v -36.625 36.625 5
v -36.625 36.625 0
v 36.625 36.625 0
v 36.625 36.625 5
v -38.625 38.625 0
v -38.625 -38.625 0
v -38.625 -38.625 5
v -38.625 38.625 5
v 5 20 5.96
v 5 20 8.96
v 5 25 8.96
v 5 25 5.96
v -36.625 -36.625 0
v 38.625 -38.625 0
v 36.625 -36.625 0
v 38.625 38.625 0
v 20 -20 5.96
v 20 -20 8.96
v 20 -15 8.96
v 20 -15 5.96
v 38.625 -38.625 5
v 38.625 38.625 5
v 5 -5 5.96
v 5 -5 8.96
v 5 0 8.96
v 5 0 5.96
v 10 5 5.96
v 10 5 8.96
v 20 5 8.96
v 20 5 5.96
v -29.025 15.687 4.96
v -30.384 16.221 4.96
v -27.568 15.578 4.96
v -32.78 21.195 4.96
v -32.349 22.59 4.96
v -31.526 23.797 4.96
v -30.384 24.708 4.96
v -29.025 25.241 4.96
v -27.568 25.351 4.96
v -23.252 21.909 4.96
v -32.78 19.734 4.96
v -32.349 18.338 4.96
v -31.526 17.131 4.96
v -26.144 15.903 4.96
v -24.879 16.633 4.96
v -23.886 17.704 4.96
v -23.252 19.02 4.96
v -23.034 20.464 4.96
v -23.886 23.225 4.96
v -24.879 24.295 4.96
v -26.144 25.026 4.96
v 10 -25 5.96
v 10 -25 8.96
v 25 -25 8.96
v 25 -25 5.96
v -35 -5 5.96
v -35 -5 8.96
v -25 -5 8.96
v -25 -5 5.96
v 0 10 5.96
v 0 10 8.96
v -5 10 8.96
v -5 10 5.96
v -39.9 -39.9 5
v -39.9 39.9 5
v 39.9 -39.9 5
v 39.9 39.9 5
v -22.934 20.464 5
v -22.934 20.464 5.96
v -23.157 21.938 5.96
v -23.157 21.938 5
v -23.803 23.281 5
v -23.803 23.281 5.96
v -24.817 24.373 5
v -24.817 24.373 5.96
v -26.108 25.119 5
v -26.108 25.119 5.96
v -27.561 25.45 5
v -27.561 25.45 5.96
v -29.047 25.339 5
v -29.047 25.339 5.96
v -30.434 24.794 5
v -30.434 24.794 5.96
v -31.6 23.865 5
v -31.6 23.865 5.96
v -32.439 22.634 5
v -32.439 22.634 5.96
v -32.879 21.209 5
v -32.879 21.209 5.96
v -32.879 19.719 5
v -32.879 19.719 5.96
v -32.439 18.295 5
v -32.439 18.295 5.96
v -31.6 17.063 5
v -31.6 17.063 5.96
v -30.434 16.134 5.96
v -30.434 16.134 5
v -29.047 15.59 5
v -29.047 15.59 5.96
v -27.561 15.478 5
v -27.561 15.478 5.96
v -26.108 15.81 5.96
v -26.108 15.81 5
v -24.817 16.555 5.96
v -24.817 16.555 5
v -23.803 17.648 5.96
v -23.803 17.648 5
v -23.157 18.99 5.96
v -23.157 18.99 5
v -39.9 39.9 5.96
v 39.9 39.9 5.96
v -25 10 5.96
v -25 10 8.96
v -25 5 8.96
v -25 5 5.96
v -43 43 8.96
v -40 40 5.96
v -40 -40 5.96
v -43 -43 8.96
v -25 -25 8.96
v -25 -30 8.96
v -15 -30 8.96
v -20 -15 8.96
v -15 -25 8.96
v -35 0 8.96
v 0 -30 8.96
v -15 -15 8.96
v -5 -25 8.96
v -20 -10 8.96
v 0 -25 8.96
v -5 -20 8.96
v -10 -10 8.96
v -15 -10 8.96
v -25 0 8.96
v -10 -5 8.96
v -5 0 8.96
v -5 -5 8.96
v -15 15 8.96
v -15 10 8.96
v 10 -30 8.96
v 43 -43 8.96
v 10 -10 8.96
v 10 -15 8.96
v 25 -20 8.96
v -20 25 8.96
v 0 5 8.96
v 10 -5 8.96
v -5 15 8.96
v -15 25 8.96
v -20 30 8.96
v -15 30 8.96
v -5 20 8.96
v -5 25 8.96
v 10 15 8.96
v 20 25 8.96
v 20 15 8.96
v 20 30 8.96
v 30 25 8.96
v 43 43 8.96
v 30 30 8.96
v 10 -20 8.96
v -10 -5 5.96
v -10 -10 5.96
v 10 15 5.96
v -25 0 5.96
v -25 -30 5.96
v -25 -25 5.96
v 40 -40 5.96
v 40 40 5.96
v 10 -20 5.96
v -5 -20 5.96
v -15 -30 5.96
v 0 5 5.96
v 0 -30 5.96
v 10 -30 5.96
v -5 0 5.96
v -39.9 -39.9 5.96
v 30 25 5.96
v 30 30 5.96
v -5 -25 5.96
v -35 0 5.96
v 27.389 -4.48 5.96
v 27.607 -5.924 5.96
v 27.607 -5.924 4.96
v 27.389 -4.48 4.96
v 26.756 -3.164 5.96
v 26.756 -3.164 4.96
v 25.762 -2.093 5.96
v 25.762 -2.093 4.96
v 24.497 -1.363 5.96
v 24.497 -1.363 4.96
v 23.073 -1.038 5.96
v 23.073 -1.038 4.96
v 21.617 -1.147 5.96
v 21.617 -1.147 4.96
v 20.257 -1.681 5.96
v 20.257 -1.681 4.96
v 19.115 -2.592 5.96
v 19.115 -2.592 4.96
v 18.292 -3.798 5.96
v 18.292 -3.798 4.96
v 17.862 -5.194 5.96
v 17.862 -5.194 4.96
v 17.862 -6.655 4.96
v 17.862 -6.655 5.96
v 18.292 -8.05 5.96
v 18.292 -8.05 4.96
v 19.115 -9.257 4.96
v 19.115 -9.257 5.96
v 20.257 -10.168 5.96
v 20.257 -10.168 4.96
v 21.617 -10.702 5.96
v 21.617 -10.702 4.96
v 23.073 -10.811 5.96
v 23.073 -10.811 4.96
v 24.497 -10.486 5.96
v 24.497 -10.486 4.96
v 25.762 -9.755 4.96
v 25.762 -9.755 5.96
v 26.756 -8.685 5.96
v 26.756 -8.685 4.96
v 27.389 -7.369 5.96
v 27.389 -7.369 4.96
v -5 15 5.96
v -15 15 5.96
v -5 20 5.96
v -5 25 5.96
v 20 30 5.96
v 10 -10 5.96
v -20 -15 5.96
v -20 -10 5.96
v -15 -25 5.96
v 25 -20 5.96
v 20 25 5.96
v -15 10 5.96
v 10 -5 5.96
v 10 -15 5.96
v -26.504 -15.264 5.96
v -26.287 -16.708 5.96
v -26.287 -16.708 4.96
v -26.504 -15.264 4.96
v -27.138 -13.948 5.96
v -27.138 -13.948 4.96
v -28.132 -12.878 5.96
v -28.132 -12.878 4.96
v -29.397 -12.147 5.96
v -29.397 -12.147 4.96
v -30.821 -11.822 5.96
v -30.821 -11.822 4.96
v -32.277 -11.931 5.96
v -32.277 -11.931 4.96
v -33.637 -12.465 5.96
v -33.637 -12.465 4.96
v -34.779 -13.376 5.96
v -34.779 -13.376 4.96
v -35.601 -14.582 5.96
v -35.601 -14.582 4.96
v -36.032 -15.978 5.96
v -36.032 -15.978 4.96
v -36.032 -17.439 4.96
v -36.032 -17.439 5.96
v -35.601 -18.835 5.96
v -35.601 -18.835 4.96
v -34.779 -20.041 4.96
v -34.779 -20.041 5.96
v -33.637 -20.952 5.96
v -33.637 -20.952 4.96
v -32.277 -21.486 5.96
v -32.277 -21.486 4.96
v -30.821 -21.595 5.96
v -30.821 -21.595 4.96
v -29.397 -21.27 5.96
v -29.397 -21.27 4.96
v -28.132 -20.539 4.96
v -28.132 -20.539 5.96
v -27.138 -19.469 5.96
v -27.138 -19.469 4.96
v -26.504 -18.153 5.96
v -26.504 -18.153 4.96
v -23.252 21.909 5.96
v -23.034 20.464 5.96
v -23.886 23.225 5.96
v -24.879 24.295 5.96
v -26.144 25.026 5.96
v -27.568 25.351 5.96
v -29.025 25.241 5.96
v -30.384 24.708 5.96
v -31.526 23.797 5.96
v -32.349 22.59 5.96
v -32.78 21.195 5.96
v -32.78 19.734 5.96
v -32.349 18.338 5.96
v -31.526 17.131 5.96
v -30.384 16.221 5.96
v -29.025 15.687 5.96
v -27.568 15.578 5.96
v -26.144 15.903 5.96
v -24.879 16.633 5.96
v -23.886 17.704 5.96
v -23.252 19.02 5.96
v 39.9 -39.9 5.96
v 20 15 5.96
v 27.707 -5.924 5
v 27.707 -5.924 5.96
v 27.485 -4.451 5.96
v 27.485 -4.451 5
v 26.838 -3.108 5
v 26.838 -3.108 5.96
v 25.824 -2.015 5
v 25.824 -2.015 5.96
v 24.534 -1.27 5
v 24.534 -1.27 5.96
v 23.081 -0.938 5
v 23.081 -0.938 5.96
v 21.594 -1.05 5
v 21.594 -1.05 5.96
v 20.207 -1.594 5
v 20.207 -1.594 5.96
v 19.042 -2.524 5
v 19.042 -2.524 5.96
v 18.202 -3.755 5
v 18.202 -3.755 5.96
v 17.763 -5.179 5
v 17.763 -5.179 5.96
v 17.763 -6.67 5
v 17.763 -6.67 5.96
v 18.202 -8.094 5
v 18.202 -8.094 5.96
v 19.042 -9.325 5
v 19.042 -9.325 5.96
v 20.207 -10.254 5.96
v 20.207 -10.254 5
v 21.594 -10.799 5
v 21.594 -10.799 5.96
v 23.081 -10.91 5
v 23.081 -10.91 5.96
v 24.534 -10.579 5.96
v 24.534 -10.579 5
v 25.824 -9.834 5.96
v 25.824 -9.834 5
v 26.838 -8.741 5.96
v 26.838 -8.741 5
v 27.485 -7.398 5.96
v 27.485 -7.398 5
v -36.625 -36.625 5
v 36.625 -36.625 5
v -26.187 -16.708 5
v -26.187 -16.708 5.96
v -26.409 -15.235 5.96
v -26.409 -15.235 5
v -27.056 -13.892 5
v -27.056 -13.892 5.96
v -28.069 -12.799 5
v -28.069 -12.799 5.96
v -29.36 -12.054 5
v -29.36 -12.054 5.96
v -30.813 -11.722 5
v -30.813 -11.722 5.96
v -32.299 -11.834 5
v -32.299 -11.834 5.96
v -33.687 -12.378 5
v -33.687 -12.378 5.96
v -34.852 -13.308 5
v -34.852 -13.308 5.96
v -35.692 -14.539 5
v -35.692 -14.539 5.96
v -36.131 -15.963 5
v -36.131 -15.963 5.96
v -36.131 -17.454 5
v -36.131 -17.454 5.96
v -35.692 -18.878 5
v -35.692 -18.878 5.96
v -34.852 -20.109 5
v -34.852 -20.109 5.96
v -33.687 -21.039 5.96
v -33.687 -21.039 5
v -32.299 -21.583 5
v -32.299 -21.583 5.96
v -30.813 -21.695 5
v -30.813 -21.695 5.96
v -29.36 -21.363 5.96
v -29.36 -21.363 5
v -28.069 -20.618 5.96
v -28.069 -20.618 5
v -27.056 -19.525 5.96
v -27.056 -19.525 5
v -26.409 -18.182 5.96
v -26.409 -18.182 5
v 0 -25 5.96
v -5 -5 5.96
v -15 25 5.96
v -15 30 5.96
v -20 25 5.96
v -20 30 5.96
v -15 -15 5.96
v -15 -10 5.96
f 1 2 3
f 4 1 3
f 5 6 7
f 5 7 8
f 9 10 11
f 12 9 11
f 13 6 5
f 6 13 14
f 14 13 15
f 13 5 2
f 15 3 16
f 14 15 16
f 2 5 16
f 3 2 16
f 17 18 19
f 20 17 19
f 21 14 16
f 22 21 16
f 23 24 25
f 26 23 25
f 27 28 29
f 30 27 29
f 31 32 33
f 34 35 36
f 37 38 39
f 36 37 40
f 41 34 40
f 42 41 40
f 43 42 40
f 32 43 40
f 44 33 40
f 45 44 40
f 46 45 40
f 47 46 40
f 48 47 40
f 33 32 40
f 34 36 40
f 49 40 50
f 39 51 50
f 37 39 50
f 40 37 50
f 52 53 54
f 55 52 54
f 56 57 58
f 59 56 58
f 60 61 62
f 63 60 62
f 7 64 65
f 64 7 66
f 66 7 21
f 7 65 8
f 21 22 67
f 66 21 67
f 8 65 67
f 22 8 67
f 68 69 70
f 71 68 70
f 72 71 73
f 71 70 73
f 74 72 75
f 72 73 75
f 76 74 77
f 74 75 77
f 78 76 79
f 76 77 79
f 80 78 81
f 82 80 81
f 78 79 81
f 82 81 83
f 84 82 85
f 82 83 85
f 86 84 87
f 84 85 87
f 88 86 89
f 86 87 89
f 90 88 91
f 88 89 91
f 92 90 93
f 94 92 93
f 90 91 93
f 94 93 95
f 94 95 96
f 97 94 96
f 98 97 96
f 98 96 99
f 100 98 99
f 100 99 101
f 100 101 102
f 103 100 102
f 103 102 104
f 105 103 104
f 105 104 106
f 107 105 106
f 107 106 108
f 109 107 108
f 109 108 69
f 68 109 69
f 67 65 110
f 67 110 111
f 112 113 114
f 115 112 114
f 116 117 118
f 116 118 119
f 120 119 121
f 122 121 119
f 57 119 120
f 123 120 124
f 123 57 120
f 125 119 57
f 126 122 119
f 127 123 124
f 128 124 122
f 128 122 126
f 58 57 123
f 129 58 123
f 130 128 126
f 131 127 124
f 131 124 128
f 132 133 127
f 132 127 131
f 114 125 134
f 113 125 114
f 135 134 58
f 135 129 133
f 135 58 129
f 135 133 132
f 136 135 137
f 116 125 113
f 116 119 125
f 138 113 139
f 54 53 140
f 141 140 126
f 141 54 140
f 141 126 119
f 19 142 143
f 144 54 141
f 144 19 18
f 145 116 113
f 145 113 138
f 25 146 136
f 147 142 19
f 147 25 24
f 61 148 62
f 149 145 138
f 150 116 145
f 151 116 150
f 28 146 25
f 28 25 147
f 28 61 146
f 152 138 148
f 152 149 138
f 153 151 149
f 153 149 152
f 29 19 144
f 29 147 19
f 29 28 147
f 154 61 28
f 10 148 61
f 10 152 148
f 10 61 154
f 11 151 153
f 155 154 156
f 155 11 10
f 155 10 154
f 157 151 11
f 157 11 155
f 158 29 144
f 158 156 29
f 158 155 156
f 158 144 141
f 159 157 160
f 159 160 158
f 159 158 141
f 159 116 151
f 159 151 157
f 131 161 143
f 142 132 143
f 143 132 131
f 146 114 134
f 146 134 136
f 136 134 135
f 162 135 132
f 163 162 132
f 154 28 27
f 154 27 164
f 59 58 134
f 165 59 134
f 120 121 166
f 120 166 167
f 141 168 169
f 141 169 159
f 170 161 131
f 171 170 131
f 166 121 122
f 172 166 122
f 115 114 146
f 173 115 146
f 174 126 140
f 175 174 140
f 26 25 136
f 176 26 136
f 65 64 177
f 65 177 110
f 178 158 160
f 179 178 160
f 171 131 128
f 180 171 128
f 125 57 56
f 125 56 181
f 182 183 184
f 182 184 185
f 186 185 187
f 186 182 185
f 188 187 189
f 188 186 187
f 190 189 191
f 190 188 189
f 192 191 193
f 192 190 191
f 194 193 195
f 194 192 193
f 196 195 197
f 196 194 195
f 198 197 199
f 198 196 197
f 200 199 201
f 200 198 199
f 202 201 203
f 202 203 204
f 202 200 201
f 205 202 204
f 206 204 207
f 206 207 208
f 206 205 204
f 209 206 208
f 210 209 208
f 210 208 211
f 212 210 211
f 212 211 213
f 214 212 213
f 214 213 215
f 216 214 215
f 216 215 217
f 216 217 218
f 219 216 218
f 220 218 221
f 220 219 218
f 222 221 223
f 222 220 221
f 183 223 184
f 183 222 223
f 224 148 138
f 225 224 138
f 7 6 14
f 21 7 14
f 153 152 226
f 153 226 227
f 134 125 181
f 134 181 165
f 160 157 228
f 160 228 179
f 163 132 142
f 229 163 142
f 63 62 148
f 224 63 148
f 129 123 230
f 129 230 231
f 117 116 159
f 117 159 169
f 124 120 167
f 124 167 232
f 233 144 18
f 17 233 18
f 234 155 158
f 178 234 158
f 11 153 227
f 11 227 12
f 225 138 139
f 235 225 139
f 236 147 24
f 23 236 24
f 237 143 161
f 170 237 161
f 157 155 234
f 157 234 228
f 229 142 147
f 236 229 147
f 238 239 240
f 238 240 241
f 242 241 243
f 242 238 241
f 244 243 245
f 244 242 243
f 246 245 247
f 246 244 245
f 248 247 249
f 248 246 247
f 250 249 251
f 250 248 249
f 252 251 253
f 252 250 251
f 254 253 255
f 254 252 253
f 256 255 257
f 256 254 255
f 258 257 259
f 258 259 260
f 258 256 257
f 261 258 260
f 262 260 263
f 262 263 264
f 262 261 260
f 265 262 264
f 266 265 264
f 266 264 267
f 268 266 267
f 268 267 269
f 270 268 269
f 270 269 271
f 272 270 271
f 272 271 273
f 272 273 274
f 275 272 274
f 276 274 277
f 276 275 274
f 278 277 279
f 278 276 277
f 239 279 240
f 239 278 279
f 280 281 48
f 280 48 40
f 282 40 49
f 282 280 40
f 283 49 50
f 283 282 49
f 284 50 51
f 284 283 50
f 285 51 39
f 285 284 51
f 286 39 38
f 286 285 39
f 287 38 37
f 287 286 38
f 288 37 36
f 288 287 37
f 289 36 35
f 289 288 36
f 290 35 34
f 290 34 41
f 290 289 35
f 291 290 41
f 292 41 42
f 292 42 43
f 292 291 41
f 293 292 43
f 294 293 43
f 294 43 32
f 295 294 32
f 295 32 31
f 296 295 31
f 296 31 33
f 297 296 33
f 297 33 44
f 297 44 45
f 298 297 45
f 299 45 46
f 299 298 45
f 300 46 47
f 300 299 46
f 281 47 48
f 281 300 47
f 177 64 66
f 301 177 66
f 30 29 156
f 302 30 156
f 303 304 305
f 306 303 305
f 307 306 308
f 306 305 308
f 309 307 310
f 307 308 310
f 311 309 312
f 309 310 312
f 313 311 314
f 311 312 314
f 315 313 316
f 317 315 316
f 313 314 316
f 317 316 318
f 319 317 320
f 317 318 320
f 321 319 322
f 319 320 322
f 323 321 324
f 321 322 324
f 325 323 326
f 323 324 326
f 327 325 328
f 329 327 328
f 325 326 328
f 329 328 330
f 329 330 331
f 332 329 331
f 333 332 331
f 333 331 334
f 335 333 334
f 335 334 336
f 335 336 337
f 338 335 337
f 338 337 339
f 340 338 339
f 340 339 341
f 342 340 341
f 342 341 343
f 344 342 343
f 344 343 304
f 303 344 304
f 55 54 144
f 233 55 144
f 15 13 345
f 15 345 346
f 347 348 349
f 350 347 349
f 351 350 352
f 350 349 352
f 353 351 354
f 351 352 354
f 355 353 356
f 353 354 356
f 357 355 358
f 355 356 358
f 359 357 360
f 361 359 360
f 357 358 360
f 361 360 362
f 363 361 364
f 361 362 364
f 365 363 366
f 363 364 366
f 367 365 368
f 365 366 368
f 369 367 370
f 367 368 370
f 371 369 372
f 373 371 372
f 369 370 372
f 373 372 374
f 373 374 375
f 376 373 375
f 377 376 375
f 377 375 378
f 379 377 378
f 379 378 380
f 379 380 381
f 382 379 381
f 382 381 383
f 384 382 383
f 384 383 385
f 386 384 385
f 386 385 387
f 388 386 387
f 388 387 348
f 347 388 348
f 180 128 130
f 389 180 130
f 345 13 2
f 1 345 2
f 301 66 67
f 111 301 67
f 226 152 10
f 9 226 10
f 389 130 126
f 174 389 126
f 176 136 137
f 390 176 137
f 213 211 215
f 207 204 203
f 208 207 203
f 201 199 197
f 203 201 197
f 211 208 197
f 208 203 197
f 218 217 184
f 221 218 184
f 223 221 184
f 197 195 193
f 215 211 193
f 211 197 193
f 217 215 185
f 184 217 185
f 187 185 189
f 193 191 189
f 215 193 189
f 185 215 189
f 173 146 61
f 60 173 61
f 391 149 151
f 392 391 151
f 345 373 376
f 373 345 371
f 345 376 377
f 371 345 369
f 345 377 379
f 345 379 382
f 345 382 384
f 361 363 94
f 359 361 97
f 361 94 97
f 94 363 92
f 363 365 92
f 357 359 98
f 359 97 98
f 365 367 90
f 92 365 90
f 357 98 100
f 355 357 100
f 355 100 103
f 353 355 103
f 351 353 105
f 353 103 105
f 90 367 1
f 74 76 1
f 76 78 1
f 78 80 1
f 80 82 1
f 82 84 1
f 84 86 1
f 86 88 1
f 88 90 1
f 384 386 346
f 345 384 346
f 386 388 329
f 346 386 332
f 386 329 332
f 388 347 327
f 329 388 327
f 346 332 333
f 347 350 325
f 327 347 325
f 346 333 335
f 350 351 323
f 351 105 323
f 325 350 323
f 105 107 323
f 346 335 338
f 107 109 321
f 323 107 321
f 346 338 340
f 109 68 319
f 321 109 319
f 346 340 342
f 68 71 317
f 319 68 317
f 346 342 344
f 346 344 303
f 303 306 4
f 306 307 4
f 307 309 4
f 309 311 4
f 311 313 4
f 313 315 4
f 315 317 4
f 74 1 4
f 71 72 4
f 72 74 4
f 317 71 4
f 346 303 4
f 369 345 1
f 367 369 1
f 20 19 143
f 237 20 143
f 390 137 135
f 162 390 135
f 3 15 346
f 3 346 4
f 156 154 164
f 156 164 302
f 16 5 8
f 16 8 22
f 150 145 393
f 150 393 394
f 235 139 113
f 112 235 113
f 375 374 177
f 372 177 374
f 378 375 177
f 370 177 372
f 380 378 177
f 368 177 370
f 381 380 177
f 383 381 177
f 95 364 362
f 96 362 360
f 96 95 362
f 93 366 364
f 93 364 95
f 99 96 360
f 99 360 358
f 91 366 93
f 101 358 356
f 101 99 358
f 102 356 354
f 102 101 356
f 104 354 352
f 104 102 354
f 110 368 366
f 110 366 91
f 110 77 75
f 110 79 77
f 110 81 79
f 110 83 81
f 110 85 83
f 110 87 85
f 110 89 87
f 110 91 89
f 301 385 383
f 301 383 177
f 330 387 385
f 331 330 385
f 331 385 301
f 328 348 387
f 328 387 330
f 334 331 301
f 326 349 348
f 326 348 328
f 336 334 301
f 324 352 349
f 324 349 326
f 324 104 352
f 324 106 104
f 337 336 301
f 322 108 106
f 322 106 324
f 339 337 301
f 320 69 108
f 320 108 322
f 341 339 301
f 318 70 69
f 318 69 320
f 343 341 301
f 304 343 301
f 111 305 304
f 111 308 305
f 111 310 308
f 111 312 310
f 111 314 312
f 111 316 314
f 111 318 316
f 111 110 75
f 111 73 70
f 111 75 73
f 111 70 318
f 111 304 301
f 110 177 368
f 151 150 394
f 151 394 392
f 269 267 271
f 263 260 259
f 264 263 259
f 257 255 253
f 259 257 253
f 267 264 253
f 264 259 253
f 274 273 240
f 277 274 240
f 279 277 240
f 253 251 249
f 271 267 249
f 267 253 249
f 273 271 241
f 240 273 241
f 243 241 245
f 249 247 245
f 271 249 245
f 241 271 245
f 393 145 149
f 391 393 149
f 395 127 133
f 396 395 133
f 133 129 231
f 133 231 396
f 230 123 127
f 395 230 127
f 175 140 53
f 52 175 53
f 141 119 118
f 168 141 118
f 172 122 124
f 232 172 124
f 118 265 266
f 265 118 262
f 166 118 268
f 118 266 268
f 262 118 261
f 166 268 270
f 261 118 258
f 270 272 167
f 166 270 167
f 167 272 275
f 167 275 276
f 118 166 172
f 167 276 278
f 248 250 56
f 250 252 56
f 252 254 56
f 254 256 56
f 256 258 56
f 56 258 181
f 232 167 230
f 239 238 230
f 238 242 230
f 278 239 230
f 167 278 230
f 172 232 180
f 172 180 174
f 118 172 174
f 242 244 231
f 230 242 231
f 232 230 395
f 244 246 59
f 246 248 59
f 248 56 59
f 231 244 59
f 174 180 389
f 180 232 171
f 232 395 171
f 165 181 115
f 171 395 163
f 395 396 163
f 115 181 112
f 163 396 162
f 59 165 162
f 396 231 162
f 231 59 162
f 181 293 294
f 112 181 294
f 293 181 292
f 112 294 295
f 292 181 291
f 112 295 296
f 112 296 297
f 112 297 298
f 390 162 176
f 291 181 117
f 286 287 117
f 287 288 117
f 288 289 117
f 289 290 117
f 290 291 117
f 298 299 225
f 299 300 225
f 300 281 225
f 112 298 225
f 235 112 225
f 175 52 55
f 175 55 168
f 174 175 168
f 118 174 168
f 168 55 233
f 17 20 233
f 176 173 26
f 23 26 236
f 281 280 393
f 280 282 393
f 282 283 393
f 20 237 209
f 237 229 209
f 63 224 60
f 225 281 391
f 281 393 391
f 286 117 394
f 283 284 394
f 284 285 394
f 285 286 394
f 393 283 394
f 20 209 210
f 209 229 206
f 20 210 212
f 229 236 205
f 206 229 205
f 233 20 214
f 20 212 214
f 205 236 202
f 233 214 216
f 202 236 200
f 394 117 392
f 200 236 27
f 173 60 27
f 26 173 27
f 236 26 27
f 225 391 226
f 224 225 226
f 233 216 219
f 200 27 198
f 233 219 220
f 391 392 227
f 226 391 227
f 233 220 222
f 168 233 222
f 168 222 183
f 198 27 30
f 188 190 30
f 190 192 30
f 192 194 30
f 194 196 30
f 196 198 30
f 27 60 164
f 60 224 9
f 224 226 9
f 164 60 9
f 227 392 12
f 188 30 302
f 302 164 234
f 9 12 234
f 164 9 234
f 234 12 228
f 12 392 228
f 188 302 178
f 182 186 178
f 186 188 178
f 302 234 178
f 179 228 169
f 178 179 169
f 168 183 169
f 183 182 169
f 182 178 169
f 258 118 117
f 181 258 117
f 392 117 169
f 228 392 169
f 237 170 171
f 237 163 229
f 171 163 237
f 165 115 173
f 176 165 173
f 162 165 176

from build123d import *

# Parameters (mm, degrees)
F0_W      = 77.25
F0_H      = 77.25
F0_W_2    = 73.25
F0_H_2    = 73.25
F1_DEPTH  = 5
F2_W      = 79.8
F2_H      = 79.8
F2_W_2    = 77.25
F2_H_2    = 77.25
F2_W_3    = 73.25
F2_H_3    = 73.25
F3_DEPTH  = 0.96
F4_R      = 5
F5_DEPTH  = 5.96
F6_W      = 86
F6_H      = 86
F7_DEPTH  = 3
F8_R      = 4.9
F9_DEPTH  = 1
F10_W     = 10
F10_H     = 5
F10_W_2   = 5
F10_H_2   = 10
F11_DEPTH = 25
F20_DEPTH = 86
F21_DEPTH = 86
F22_DEPTH = 86.001
F23_REACH = 90.2436406871


with BuildPart() as f1:
    # F0 (on Top) → F1 (new body)
    with BuildSketch(Plane.XY):
        Rectangle(F0_W, F0_H)
        Rectangle(F0_W_2, F0_H_2, mode=Mode.SUBTRACT)
    extrude(amount=F1_DEPTH)

    # F2 (on face) → F3 (join)
    with BuildSketch(Plane.XY.offset(5)):
        Rectangle(F2_W, F2_H)
        Rectangle(F2_W_2, F2_H_2, mode=Mode.SUBTRACT)
        Rectangle(F2_W_2, F2_H_2)
        Rectangle(F2_W_3, F2_H_3, mode=Mode.SUBTRACT)
        Rectangle(F2_W_3, F2_H_3)
    extrude(amount=F3_DEPTH)

    # F4 (on face) → F5 (cut, through all)
    with BuildSketch(Plane.XY.offset(5.96)):
        with Locations((-31.1867402621, -16.7084898855)):
            Circle(F4_R)
        with Locations((-27.9344634459, 20.4642405513)):
            Circle(F4_R)
        with Locations((22.7069496598, -5.9243687574)):
            Circle(F4_R)
    extrude(amount=-F5_DEPTH, mode=Mode.SUBTRACT)


with BuildPart() as f7:
    # F6 (on face) → F7 (new body)
    with BuildSketch(Plane.XY.offset(5.96)):
        Rectangle(F6_W, F6_H)
    extrude(amount=F7_DEPTH)

    # F8 (on face) → F9 (join)
    with BuildSketch(Plane.XY.offset(5.96)):
        with Locations((-31.1867402621, -16.7084898855)):
            Circle(F8_R)
        with Locations((22.7069496598, -5.9243687574)):
            Circle(F8_R)
        with Locations((-27.9344634459, 20.4642405513)):
            Circle(F8_R)
    extrude(amount=-F9_DEPTH)

    # F10 (on face) → F11 (cut)
    with BuildSketch(Plane.XY.offset(8.96)):
        with Locations((-20, -27.5)):
            Rectangle(F10_W, F10_H)
        Polygon((20, -15), (10, -15), (10, -20), (-5, -20), (-5, -25), (0, -25), (0, -30), (10, -30), (10, -25), (25, -25), (25, -20), (20, -20), align=None)
        Polygon((5, -5), (5, 0), (-5, 0), (-5, -5), (-10, -5), (-10, -10), (10, -10), (10, -5), align=None)
        with Locations((-17.5, -12.5)):
            Rectangle(F10_W_2, F10_H)
        with Locations((-30, -2.5)):
            Rectangle(F10_W, F10_H)
        with Locations((-17.5, 27.5)):
            Rectangle(F10_W_2, F10_H)
        with Locations((0, 22.5)):
            Rectangle(F10_W, F10_H)
        with Locations((15, 10)):
            Rectangle(F10_W, F10_H_2)
        with Locations((25, 27.5)):
            Rectangle(F10_W, F10_H)
        Polygon((-25, 5), (0, 5), (0, 10), (-5, 10), (-5, 15), (-15, 15), (-15, 10), (-25, 10), align=None)
    extrude(amount=-F11_DEPTH, mode=Mode.SUBTRACT)

    # F16 (on offset) → F20 (cut, through all)
    with BuildSketch(Plane.XZ.offset(43)):
        Polygon((-43, 8.96), (-43, 5.96), (-40, 5.96), align=None)
    extrude(amount=-F20_DEPTH, mode=Mode.SUBTRACT)

    # F17 (on offset) → F21 (cut, through all)
    with BuildSketch(Plane(origin=(-43, 0, 0), x_dir=(0, -1, 0), z_dir=(-1, 0, 0))):
        Polygon((43, 5.96), (43, 8.96), (40, 5.96), align=None)
    extrude(amount=-F21_DEPTH, mode=Mode.SUBTRACT)

    # F18 (on offset) → F22 (cut, through all)
    with BuildSketch(Plane(origin=(0, 43, 0), x_dir=(-1, 0, 0), z_dir=(0, 1, 0))):
        Polygon((-40, 5.96), (-43, 8.96), (-43, 5.96), align=None)
    extrude(amount=-F22_DEPTH, mode=Mode.SUBTRACT)

    f23_end = f7.faces().sort_by_distance((-41.5088757396, 0.7455621302, 7.4688757396))[0]
    # F19 (on offset) → F23 (cut, up to a face of the model that its end follows)
    with BuildSketch(Plane.YZ.offset(43)):
        Polygon((43, 5.96), (43, 8.96), (40, 5.96), align=None)
    f23_long = extrude(amount=-F23_REACH, mode=Mode.PRIVATE)
    add(split(f23_long, bisect_by=f23_end, keep=Keep.BOTTOM, mode=Mode.PRIVATE), mode=Mode.SUBTRACT)


solid = Compound([f1.part, f7.part])
